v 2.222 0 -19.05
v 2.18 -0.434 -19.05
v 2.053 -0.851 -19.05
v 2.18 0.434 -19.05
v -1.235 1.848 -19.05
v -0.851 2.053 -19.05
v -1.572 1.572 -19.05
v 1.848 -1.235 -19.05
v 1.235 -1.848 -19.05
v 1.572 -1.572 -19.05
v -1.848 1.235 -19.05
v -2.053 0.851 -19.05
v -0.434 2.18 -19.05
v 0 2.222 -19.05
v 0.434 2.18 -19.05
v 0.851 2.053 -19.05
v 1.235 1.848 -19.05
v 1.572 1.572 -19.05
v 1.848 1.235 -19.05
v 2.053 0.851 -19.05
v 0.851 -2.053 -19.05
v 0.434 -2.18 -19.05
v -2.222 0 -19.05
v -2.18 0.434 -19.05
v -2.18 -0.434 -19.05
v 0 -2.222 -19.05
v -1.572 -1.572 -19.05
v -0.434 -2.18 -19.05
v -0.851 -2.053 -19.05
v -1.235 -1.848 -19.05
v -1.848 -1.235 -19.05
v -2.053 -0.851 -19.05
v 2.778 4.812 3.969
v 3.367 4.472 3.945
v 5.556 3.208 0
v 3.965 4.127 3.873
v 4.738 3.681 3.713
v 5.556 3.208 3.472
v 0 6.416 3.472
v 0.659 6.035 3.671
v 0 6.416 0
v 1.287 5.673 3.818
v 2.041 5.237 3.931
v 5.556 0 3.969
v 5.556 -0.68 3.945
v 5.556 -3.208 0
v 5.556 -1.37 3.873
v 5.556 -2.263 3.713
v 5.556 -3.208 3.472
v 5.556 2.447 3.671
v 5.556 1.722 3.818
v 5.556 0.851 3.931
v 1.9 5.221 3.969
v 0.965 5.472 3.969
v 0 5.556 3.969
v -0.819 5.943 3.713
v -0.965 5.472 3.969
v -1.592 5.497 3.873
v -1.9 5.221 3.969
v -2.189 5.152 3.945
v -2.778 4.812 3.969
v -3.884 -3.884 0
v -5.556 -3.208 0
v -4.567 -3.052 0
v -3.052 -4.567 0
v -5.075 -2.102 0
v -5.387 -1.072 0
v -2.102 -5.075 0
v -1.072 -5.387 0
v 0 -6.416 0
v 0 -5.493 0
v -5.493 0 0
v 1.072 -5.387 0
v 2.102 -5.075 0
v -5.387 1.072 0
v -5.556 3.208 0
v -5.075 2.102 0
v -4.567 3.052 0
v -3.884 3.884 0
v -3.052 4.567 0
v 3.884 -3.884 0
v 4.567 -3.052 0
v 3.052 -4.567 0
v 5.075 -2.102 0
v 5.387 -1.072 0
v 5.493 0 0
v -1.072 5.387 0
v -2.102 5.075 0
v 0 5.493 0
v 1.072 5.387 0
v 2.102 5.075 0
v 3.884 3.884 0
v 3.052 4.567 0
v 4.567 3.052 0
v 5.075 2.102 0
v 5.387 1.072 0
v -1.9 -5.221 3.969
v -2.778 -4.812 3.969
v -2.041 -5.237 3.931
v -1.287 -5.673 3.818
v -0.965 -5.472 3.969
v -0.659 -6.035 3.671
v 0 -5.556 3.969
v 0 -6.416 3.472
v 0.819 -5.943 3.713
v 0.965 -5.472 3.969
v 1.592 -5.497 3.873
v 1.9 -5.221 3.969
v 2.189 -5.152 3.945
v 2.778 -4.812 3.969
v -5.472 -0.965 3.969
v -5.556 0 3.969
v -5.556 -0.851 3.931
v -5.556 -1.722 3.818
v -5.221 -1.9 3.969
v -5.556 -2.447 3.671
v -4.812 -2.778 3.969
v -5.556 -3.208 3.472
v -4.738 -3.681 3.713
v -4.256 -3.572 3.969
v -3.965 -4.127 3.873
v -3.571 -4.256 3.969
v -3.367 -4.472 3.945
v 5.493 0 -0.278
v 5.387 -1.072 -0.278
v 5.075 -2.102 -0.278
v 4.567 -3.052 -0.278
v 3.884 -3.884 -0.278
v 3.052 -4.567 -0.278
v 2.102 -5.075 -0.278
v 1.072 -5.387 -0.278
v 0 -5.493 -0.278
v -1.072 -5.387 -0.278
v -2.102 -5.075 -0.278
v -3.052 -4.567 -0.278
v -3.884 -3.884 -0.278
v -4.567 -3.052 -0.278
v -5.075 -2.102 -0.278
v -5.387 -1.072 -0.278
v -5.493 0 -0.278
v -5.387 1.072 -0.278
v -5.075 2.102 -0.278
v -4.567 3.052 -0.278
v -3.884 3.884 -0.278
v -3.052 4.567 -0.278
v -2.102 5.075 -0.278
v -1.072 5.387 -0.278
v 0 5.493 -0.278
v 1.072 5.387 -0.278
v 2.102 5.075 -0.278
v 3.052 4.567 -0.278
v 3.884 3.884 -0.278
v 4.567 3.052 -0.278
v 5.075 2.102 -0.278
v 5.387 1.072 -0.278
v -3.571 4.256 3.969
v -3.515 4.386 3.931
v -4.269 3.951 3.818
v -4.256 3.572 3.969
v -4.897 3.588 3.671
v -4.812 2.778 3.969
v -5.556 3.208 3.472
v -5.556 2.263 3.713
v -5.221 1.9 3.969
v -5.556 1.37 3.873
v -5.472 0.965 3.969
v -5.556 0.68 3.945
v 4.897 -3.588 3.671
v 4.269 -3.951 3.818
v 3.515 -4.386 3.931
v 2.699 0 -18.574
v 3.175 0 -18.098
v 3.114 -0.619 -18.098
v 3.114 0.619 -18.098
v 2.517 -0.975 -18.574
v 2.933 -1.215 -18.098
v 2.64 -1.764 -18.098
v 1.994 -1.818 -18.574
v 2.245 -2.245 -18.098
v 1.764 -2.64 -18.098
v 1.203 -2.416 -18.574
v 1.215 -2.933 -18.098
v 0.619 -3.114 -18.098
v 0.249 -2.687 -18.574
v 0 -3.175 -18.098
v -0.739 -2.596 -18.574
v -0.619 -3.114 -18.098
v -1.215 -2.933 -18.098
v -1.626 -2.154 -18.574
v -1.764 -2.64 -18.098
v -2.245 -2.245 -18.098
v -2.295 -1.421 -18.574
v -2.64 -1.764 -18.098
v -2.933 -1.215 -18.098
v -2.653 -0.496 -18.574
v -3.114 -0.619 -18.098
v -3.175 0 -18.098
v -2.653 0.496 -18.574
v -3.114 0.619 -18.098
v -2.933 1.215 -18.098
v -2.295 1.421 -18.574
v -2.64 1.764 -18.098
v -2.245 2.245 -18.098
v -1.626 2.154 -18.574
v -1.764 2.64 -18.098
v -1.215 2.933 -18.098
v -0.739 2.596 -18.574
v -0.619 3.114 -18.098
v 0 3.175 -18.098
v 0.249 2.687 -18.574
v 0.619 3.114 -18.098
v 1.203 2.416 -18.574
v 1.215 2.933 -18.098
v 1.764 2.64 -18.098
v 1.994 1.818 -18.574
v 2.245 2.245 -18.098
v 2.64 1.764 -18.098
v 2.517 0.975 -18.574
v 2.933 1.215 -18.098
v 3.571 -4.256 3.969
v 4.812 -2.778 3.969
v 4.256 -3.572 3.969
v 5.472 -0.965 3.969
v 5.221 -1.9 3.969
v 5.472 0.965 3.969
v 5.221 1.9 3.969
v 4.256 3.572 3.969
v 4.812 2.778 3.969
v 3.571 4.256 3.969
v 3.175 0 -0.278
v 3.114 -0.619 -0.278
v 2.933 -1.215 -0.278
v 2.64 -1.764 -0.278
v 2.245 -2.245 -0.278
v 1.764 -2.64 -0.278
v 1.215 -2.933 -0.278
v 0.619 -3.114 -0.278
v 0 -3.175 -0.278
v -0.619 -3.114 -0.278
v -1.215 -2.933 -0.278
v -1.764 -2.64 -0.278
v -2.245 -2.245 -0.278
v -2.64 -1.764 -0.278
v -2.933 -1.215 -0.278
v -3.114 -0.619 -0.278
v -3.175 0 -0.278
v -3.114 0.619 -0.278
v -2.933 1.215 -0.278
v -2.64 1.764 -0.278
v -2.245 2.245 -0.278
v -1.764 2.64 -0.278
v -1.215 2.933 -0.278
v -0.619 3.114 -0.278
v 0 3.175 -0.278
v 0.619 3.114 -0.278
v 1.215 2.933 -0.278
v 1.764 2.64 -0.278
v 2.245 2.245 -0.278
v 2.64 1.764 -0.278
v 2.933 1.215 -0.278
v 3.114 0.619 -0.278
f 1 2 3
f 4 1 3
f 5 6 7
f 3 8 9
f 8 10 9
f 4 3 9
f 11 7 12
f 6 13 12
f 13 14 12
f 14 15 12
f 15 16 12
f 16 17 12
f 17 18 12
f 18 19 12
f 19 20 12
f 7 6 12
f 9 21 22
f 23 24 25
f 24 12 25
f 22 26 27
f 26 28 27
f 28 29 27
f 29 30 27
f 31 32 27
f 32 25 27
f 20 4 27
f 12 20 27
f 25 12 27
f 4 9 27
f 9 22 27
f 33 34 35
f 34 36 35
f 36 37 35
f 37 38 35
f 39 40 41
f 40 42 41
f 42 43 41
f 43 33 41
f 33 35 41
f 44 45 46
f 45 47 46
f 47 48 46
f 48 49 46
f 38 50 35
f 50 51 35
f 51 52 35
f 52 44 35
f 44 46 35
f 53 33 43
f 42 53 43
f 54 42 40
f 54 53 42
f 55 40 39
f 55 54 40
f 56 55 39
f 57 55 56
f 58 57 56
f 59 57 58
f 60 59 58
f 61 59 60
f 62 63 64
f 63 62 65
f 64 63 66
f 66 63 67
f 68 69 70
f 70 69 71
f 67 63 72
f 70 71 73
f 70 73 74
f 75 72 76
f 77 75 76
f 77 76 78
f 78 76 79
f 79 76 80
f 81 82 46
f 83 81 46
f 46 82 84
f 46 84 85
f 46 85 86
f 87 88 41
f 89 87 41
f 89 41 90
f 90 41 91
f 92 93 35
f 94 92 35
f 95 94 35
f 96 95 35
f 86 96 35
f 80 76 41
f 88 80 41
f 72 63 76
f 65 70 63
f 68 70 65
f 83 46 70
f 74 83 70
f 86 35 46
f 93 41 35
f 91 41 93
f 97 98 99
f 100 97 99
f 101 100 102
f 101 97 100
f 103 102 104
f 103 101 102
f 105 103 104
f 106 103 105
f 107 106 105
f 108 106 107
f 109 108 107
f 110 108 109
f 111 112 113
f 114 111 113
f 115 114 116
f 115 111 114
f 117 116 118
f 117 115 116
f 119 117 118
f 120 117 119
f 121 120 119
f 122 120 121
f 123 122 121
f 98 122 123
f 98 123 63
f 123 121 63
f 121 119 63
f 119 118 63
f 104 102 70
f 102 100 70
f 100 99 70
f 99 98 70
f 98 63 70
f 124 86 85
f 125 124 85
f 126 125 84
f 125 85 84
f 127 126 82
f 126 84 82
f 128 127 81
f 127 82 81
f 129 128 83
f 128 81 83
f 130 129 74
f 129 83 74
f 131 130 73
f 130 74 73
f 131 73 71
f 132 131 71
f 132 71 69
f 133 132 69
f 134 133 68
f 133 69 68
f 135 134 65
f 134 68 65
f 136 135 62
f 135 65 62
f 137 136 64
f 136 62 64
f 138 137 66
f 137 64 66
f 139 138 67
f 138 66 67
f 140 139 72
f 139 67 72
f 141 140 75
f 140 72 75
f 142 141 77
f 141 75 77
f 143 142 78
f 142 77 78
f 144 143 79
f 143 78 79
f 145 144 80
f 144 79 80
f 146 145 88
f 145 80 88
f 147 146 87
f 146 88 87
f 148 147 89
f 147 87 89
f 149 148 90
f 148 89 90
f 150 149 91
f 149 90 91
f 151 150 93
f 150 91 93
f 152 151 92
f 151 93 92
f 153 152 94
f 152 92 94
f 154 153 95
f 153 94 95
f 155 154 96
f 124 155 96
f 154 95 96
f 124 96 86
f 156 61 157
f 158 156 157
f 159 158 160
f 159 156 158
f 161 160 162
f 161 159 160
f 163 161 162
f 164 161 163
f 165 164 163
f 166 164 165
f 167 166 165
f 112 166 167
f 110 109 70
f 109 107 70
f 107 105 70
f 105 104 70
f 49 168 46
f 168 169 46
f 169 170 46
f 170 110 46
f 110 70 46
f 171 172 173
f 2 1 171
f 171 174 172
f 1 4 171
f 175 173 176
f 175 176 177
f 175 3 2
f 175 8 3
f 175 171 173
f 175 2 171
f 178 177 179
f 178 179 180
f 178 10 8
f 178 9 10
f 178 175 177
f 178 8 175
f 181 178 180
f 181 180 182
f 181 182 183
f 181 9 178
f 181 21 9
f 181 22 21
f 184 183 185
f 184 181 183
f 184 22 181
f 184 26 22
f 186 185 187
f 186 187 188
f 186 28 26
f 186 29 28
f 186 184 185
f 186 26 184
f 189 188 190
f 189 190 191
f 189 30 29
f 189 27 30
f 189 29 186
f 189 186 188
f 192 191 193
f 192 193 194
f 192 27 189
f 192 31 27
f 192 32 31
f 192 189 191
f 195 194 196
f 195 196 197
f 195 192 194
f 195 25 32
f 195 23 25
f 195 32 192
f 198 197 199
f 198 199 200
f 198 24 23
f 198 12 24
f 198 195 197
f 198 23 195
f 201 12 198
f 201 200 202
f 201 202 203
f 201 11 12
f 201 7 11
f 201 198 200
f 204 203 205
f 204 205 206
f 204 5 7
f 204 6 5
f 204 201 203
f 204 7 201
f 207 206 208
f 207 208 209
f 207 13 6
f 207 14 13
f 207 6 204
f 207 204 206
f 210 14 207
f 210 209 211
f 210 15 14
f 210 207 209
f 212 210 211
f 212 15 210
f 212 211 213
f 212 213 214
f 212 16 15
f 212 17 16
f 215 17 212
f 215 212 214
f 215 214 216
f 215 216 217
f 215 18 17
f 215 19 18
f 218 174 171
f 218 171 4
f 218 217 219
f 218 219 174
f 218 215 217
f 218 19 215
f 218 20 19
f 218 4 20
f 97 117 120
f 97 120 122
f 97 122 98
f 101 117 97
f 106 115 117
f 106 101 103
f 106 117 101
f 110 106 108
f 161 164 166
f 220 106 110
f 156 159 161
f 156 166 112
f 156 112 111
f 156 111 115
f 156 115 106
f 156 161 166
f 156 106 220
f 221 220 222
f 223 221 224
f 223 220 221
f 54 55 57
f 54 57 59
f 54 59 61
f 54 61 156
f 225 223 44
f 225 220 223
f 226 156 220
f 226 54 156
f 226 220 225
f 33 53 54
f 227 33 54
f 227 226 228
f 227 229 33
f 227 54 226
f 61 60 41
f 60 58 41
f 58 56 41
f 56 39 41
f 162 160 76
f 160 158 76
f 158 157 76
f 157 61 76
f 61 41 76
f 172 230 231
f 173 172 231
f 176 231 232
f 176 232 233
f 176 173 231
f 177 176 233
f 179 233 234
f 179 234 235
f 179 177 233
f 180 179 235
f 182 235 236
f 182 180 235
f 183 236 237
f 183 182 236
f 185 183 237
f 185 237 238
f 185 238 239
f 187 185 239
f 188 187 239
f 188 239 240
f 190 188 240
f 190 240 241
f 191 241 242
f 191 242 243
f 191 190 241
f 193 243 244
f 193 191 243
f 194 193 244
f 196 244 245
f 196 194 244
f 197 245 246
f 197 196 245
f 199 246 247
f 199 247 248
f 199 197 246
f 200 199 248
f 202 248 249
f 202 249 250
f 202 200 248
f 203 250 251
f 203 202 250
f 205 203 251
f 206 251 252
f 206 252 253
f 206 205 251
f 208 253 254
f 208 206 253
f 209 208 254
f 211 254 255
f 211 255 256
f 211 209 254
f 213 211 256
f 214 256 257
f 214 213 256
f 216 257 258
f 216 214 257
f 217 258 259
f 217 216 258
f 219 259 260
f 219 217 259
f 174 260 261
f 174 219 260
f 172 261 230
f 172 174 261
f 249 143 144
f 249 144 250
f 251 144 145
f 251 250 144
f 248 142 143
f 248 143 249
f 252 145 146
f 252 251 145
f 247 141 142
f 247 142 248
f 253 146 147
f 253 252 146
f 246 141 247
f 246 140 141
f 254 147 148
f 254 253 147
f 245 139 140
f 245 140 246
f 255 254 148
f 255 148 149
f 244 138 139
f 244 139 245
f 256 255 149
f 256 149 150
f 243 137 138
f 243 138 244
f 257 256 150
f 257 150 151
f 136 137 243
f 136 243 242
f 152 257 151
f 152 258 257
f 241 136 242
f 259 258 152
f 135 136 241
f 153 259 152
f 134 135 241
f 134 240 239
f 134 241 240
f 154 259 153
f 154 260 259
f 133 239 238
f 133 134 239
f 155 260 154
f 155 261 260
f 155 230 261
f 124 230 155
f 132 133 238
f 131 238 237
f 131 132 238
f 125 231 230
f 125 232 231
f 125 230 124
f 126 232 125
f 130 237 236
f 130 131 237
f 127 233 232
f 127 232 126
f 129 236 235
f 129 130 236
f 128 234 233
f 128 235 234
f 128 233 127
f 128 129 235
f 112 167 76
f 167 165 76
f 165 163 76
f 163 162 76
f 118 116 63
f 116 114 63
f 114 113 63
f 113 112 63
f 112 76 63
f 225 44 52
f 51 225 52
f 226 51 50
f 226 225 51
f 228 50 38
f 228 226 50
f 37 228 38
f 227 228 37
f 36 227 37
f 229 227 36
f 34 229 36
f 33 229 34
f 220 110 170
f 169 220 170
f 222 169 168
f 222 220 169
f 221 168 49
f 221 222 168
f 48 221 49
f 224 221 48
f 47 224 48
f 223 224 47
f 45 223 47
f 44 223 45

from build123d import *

# Parameters (mm, degrees)
SKETCH2_W           = 19.05
SKETCH2_H           = 3.175
BOSS_EXTRUDE1_DEPTH = 3.96875
SKETCH7_R           = 5.49275
BOSS_EXTRUDE2_DEPTH = 0.2778125
CHAMFER1_SIZE       = 0.9525
SKETCH4_OUTSIDE_W   = 107.284
SKETCH4_OUTSIDE_H   = 109.004
SKETCH4_OUTSIDE_R   = 5.55625
CUT_EXTRUDE1_DEPTH  = 25.533595695
CUT_EXTRUDE1_DRAFT  = -60


with BuildPart() as part:
    # Sketch2 → Revolve1 (revolve)
    with BuildSketch(Plane(origin=(0, 0, 0), x_dir=(0, 0, -1), z_dir=(1, 0, 0)), mode=Mode.PRIVATE) as revolve1_sk:
        with Locations((9.525, 1.5875)):
            Rectangle(SKETCH2_W, SKETCH2_H)
    revolve(revolve1_sk.sketch.rotate(Axis((0, 0, 0), (0, 0, -1)), 90), axis=Axis((0, 0, 0), (0, 0, -1)))

    # Sketch3 → Boss-Extrude1 (add)
    with BuildSketch(Plane.XY):
        Polygon((0, 6.415804866), (-5.55625, 3.207902433), (-5.55625, -3.207902433), (0, -6.415804866), (5.55625, -3.207902433), (5.55625, 3.207902433), align=None)
    extrude(amount=BOSS_EXTRUDE1_DEPTH)

    # Sketch7 → Boss-Extrude2 (add)
    with BuildSketch(Plane(origin=(0, 0, 0), x_dir=(-1, 0, 0), z_dir=(0, 0, -1))):
        with Locations(Location((0, 0, 0), (0, 0, 180))):
            Circle(SKETCH7_R)
    extrude(amount=BOSS_EXTRUDE2_DEPTH)

    # Chamfer1
    chamfer1_edges = [part.edges().sort_by_distance(p)[0] for p in [
        (-3.175, 0, -19.05),
    ]]
    chamfer(chamfer1_edges, length=CHAMFER1_SIZE)


with BuildPart() as cut_extrude1_tool:
    # Sketch4 outside → Cut-Extrude1 (with draft: the straight prism first)
    with BuildSketch(Plane.XY.offset(3.96875)):
        Rectangle(SKETCH4_OUTSIDE_W, SKETCH4_OUTSIDE_H)
        Circle(SKETCH4_OUTSIDE_R, mode=Mode.SUBTRACT)
    extrude(amount=-CUT_EXTRUDE1_DEPTH)
    # Cut-Extrude1: the draft: its side faces are tilted about the plane it starts from
    cut_extrude1_sides = [cut_extrude1_tool.faces().sort_by_distance(p)[0] for p in [
        (0, -54.502, -8.798047847),
        (53.642, 0, -8.798047847),
        (0, 54.502, -8.798047847),
        (-53.642, 0, -8.798047847),
        (-5.55625, 0, -8.798047847),
    ]]
    draft(cut_extrude1_sides, Plane.XY.offset(3.96875), CUT_EXTRUDE1_DRAFT)


with BuildPart() as part_1:
    add(part.part)

    # Cut-Extrude1: cut by cut_extrude1_tool
    add(cut_extrude1_tool.part, mode=Mode.SUBTRACT)


solid = part_1.part
